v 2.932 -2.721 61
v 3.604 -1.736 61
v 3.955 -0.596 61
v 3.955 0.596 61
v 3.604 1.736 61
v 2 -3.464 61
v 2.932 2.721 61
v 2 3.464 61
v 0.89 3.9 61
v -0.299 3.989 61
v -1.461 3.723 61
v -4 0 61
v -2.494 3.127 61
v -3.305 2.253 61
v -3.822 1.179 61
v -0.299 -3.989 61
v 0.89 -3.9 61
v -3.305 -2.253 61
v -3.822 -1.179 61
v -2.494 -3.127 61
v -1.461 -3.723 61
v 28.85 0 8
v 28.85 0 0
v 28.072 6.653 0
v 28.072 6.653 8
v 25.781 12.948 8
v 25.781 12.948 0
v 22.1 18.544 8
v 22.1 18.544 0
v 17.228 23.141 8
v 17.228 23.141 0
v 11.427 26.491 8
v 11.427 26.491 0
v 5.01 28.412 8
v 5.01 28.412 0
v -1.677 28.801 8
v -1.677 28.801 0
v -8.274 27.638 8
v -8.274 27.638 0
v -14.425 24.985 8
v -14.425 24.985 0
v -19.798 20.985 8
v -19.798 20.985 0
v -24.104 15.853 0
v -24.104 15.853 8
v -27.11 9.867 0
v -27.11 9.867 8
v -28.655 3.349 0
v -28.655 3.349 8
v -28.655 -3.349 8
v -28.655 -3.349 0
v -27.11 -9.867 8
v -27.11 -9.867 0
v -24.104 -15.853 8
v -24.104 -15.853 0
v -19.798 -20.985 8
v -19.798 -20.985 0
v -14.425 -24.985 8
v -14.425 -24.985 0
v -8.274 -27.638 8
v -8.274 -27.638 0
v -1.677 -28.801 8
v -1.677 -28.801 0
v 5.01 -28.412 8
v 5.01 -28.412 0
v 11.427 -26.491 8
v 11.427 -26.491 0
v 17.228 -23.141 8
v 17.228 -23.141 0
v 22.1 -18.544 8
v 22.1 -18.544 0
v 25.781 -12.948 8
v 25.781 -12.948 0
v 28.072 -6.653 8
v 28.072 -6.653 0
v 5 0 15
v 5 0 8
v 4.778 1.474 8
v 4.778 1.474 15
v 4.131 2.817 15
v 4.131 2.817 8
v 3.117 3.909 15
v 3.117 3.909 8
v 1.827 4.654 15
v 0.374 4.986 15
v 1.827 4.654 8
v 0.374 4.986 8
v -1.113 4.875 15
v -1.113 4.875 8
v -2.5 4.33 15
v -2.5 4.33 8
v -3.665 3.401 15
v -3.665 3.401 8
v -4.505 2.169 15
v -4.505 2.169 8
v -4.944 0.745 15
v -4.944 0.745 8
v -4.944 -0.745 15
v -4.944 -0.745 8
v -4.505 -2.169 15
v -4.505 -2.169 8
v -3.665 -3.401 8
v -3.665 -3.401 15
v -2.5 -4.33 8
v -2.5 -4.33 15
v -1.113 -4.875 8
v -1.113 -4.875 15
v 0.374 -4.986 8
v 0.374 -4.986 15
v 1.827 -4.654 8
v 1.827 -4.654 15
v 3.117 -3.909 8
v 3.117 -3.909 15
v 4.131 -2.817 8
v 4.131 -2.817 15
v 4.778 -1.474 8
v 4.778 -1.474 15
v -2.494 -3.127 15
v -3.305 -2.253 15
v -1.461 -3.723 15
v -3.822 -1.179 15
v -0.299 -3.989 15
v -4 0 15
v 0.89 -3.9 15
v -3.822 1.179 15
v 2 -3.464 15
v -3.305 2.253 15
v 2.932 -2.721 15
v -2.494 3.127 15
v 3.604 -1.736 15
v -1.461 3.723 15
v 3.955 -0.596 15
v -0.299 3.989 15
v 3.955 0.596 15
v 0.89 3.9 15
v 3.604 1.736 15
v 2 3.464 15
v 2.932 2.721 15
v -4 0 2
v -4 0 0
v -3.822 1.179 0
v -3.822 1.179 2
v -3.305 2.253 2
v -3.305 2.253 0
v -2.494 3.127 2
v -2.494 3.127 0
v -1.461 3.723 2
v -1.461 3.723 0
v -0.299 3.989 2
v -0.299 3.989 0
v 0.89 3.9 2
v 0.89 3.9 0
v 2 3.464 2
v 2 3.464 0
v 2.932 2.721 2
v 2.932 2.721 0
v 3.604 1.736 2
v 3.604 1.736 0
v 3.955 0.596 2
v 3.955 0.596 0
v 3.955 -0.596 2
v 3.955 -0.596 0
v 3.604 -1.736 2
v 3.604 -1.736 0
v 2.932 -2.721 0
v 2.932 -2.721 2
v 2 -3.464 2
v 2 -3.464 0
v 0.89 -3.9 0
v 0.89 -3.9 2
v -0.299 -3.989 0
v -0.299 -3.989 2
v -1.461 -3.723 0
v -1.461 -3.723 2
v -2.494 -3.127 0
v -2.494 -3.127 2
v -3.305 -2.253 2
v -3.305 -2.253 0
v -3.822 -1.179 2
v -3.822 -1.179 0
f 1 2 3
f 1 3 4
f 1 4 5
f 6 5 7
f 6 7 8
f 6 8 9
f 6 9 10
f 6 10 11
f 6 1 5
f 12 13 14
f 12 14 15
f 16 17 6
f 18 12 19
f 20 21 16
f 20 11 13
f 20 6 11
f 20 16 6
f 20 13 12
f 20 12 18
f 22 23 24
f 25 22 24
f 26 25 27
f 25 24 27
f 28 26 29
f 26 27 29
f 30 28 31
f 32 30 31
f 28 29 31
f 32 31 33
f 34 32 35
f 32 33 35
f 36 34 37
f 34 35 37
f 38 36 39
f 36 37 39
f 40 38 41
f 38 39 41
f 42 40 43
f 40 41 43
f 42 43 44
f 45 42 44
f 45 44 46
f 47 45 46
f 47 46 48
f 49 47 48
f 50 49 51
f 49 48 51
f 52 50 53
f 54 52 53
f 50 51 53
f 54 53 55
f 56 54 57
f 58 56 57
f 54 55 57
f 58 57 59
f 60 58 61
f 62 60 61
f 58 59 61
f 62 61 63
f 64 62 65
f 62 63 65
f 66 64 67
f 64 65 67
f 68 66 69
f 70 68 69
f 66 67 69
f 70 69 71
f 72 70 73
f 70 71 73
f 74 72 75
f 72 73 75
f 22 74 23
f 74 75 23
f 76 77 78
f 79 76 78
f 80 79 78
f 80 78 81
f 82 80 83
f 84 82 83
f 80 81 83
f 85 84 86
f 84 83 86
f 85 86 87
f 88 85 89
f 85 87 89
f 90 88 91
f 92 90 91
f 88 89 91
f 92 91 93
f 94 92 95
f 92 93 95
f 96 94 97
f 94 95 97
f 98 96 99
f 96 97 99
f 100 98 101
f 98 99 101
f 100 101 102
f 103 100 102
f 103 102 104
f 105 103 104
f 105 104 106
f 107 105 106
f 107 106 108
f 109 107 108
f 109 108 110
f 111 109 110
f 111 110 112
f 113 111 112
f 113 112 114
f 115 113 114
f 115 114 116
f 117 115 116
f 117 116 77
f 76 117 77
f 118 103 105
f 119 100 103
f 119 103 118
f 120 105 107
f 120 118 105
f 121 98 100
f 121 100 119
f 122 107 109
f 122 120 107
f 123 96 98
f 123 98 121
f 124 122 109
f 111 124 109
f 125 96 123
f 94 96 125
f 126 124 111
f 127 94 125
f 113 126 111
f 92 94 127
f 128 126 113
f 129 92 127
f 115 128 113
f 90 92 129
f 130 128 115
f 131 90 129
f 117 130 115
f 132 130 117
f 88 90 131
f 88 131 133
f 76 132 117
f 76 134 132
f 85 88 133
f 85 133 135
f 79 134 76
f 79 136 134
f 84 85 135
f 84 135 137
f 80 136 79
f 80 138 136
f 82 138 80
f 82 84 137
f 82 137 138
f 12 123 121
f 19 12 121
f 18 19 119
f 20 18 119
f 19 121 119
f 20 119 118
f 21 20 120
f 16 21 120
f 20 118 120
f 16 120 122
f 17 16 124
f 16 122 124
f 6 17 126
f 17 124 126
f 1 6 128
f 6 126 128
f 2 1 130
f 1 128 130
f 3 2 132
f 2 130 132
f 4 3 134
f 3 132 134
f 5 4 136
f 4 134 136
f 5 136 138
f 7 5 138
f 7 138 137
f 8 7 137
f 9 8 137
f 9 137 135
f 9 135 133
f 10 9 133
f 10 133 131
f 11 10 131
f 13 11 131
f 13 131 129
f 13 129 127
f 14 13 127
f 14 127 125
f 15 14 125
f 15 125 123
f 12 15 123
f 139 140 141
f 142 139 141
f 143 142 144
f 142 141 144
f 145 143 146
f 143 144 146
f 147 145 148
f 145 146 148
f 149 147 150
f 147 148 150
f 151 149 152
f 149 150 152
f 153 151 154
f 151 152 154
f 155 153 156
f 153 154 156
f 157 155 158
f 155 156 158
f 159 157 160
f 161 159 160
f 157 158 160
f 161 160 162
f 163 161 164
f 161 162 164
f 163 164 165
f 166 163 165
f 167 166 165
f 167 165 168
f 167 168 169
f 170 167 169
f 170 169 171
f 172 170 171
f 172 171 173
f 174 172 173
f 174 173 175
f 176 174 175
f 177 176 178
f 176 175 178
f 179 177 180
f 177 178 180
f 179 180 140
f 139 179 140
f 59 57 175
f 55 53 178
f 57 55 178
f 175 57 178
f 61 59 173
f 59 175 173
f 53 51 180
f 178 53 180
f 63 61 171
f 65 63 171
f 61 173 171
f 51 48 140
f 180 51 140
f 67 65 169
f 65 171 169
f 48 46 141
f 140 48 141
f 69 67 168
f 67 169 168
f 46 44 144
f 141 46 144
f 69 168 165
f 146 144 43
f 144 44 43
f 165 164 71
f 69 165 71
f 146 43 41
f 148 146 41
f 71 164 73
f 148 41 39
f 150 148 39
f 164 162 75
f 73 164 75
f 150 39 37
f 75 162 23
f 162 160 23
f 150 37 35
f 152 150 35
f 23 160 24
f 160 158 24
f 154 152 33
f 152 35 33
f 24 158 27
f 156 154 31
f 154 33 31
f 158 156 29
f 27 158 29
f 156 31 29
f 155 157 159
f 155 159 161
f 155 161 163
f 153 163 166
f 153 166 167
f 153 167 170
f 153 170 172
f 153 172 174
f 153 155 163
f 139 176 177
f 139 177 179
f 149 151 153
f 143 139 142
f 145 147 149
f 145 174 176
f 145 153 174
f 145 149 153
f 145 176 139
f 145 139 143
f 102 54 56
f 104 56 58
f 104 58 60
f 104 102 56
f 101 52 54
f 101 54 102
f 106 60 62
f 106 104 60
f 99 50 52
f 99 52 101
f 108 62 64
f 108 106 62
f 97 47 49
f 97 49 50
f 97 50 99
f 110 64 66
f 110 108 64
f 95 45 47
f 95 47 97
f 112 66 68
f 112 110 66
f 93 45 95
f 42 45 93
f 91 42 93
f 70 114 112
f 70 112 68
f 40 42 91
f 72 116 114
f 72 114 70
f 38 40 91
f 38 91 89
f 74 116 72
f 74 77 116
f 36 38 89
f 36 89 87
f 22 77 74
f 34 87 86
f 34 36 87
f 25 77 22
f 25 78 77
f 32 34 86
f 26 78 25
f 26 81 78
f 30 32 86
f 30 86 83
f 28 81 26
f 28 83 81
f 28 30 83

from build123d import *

# Parameters (mm, degrees)
ESQUISSE1_R             = 28.85
BOSS_EXTRU_1_DEPTH      = 8
ESQUISSE3_R             = 4
ENL_V_MAT_EXTRU_1_DEPTH = 2
ESQUISSE2_R             = 5
ESQUISSE2_R_2           = 4
BOSS_EXTRU_2_DEPTH      = 7
ESQUISSE2_2_R           = 5
ESQUISSE2_2_R_2         = 4
BOSS_EXTRU_3_DEPTH      = 2
ESQUISSE2_3_R           = 5
ESQUISSE2_3_R_2         = 4
BOSS_EXTRU_4_DEPTH      = 4
ESQUISSE4_R             = 4
BOSS_EXTRU_6_DEPTH      = 53


with BuildPart() as part:
    # Esquisse1 → Boss.-Extru.1 (new body)
    with BuildSketch(Plane.XY):
        Circle(ESQUISSE1_R)
    extrude(amount=BOSS_EXTRU_1_DEPTH)

    # Esquisse3 → Enlèv. mat.-Extru.1 (cut)
    with BuildSketch(Plane(origin=(0, 0, 0), x_dir=(-1, 0, 0), z_dir=(0, 0, -1))):
        Circle(ESQUISSE3_R)
    extrude(amount=-ENL_V_MAT_EXTRU_1_DEPTH, mode=Mode.SUBTRACT)

    # Esquisse2 → Boss.-Extru.2 (add)
    with BuildSketch(Plane.XY.offset(8)):
        Circle(ESQUISSE2_R)
        Circle(ESQUISSE2_R_2, mode=Mode.SUBTRACT)
    extrude(amount=BOSS_EXTRU_2_DEPTH)

    # Esquisse2<2> → Boss.-Extru.3 (add)
    with BuildSketch(Plane.XY.offset(8)):
        Circle(ESQUISSE2_2_R)
        Circle(ESQUISSE2_2_R_2, mode=Mode.SUBTRACT)
    extrude(amount=BOSS_EXTRU_3_DEPTH)

    # Esquisse2<3> → Boss.-Extru.4 (add)
    with BuildSketch(Plane.XY.offset(8)):
        Circle(ESQUISSE2_3_R)
        Circle(ESQUISSE2_3_R_2, mode=Mode.SUBTRACT)
    extrude(amount=BOSS_EXTRU_4_DEPTH)

    # Esquisse4 → Boss.-Extru.6 (add)
    with BuildSketch(Plane.XY.offset(8)):
        Circle(ESQUISSE4_R)
    extrude(amount=BOSS_EXTRU_6_DEPTH)


solid = part.part
